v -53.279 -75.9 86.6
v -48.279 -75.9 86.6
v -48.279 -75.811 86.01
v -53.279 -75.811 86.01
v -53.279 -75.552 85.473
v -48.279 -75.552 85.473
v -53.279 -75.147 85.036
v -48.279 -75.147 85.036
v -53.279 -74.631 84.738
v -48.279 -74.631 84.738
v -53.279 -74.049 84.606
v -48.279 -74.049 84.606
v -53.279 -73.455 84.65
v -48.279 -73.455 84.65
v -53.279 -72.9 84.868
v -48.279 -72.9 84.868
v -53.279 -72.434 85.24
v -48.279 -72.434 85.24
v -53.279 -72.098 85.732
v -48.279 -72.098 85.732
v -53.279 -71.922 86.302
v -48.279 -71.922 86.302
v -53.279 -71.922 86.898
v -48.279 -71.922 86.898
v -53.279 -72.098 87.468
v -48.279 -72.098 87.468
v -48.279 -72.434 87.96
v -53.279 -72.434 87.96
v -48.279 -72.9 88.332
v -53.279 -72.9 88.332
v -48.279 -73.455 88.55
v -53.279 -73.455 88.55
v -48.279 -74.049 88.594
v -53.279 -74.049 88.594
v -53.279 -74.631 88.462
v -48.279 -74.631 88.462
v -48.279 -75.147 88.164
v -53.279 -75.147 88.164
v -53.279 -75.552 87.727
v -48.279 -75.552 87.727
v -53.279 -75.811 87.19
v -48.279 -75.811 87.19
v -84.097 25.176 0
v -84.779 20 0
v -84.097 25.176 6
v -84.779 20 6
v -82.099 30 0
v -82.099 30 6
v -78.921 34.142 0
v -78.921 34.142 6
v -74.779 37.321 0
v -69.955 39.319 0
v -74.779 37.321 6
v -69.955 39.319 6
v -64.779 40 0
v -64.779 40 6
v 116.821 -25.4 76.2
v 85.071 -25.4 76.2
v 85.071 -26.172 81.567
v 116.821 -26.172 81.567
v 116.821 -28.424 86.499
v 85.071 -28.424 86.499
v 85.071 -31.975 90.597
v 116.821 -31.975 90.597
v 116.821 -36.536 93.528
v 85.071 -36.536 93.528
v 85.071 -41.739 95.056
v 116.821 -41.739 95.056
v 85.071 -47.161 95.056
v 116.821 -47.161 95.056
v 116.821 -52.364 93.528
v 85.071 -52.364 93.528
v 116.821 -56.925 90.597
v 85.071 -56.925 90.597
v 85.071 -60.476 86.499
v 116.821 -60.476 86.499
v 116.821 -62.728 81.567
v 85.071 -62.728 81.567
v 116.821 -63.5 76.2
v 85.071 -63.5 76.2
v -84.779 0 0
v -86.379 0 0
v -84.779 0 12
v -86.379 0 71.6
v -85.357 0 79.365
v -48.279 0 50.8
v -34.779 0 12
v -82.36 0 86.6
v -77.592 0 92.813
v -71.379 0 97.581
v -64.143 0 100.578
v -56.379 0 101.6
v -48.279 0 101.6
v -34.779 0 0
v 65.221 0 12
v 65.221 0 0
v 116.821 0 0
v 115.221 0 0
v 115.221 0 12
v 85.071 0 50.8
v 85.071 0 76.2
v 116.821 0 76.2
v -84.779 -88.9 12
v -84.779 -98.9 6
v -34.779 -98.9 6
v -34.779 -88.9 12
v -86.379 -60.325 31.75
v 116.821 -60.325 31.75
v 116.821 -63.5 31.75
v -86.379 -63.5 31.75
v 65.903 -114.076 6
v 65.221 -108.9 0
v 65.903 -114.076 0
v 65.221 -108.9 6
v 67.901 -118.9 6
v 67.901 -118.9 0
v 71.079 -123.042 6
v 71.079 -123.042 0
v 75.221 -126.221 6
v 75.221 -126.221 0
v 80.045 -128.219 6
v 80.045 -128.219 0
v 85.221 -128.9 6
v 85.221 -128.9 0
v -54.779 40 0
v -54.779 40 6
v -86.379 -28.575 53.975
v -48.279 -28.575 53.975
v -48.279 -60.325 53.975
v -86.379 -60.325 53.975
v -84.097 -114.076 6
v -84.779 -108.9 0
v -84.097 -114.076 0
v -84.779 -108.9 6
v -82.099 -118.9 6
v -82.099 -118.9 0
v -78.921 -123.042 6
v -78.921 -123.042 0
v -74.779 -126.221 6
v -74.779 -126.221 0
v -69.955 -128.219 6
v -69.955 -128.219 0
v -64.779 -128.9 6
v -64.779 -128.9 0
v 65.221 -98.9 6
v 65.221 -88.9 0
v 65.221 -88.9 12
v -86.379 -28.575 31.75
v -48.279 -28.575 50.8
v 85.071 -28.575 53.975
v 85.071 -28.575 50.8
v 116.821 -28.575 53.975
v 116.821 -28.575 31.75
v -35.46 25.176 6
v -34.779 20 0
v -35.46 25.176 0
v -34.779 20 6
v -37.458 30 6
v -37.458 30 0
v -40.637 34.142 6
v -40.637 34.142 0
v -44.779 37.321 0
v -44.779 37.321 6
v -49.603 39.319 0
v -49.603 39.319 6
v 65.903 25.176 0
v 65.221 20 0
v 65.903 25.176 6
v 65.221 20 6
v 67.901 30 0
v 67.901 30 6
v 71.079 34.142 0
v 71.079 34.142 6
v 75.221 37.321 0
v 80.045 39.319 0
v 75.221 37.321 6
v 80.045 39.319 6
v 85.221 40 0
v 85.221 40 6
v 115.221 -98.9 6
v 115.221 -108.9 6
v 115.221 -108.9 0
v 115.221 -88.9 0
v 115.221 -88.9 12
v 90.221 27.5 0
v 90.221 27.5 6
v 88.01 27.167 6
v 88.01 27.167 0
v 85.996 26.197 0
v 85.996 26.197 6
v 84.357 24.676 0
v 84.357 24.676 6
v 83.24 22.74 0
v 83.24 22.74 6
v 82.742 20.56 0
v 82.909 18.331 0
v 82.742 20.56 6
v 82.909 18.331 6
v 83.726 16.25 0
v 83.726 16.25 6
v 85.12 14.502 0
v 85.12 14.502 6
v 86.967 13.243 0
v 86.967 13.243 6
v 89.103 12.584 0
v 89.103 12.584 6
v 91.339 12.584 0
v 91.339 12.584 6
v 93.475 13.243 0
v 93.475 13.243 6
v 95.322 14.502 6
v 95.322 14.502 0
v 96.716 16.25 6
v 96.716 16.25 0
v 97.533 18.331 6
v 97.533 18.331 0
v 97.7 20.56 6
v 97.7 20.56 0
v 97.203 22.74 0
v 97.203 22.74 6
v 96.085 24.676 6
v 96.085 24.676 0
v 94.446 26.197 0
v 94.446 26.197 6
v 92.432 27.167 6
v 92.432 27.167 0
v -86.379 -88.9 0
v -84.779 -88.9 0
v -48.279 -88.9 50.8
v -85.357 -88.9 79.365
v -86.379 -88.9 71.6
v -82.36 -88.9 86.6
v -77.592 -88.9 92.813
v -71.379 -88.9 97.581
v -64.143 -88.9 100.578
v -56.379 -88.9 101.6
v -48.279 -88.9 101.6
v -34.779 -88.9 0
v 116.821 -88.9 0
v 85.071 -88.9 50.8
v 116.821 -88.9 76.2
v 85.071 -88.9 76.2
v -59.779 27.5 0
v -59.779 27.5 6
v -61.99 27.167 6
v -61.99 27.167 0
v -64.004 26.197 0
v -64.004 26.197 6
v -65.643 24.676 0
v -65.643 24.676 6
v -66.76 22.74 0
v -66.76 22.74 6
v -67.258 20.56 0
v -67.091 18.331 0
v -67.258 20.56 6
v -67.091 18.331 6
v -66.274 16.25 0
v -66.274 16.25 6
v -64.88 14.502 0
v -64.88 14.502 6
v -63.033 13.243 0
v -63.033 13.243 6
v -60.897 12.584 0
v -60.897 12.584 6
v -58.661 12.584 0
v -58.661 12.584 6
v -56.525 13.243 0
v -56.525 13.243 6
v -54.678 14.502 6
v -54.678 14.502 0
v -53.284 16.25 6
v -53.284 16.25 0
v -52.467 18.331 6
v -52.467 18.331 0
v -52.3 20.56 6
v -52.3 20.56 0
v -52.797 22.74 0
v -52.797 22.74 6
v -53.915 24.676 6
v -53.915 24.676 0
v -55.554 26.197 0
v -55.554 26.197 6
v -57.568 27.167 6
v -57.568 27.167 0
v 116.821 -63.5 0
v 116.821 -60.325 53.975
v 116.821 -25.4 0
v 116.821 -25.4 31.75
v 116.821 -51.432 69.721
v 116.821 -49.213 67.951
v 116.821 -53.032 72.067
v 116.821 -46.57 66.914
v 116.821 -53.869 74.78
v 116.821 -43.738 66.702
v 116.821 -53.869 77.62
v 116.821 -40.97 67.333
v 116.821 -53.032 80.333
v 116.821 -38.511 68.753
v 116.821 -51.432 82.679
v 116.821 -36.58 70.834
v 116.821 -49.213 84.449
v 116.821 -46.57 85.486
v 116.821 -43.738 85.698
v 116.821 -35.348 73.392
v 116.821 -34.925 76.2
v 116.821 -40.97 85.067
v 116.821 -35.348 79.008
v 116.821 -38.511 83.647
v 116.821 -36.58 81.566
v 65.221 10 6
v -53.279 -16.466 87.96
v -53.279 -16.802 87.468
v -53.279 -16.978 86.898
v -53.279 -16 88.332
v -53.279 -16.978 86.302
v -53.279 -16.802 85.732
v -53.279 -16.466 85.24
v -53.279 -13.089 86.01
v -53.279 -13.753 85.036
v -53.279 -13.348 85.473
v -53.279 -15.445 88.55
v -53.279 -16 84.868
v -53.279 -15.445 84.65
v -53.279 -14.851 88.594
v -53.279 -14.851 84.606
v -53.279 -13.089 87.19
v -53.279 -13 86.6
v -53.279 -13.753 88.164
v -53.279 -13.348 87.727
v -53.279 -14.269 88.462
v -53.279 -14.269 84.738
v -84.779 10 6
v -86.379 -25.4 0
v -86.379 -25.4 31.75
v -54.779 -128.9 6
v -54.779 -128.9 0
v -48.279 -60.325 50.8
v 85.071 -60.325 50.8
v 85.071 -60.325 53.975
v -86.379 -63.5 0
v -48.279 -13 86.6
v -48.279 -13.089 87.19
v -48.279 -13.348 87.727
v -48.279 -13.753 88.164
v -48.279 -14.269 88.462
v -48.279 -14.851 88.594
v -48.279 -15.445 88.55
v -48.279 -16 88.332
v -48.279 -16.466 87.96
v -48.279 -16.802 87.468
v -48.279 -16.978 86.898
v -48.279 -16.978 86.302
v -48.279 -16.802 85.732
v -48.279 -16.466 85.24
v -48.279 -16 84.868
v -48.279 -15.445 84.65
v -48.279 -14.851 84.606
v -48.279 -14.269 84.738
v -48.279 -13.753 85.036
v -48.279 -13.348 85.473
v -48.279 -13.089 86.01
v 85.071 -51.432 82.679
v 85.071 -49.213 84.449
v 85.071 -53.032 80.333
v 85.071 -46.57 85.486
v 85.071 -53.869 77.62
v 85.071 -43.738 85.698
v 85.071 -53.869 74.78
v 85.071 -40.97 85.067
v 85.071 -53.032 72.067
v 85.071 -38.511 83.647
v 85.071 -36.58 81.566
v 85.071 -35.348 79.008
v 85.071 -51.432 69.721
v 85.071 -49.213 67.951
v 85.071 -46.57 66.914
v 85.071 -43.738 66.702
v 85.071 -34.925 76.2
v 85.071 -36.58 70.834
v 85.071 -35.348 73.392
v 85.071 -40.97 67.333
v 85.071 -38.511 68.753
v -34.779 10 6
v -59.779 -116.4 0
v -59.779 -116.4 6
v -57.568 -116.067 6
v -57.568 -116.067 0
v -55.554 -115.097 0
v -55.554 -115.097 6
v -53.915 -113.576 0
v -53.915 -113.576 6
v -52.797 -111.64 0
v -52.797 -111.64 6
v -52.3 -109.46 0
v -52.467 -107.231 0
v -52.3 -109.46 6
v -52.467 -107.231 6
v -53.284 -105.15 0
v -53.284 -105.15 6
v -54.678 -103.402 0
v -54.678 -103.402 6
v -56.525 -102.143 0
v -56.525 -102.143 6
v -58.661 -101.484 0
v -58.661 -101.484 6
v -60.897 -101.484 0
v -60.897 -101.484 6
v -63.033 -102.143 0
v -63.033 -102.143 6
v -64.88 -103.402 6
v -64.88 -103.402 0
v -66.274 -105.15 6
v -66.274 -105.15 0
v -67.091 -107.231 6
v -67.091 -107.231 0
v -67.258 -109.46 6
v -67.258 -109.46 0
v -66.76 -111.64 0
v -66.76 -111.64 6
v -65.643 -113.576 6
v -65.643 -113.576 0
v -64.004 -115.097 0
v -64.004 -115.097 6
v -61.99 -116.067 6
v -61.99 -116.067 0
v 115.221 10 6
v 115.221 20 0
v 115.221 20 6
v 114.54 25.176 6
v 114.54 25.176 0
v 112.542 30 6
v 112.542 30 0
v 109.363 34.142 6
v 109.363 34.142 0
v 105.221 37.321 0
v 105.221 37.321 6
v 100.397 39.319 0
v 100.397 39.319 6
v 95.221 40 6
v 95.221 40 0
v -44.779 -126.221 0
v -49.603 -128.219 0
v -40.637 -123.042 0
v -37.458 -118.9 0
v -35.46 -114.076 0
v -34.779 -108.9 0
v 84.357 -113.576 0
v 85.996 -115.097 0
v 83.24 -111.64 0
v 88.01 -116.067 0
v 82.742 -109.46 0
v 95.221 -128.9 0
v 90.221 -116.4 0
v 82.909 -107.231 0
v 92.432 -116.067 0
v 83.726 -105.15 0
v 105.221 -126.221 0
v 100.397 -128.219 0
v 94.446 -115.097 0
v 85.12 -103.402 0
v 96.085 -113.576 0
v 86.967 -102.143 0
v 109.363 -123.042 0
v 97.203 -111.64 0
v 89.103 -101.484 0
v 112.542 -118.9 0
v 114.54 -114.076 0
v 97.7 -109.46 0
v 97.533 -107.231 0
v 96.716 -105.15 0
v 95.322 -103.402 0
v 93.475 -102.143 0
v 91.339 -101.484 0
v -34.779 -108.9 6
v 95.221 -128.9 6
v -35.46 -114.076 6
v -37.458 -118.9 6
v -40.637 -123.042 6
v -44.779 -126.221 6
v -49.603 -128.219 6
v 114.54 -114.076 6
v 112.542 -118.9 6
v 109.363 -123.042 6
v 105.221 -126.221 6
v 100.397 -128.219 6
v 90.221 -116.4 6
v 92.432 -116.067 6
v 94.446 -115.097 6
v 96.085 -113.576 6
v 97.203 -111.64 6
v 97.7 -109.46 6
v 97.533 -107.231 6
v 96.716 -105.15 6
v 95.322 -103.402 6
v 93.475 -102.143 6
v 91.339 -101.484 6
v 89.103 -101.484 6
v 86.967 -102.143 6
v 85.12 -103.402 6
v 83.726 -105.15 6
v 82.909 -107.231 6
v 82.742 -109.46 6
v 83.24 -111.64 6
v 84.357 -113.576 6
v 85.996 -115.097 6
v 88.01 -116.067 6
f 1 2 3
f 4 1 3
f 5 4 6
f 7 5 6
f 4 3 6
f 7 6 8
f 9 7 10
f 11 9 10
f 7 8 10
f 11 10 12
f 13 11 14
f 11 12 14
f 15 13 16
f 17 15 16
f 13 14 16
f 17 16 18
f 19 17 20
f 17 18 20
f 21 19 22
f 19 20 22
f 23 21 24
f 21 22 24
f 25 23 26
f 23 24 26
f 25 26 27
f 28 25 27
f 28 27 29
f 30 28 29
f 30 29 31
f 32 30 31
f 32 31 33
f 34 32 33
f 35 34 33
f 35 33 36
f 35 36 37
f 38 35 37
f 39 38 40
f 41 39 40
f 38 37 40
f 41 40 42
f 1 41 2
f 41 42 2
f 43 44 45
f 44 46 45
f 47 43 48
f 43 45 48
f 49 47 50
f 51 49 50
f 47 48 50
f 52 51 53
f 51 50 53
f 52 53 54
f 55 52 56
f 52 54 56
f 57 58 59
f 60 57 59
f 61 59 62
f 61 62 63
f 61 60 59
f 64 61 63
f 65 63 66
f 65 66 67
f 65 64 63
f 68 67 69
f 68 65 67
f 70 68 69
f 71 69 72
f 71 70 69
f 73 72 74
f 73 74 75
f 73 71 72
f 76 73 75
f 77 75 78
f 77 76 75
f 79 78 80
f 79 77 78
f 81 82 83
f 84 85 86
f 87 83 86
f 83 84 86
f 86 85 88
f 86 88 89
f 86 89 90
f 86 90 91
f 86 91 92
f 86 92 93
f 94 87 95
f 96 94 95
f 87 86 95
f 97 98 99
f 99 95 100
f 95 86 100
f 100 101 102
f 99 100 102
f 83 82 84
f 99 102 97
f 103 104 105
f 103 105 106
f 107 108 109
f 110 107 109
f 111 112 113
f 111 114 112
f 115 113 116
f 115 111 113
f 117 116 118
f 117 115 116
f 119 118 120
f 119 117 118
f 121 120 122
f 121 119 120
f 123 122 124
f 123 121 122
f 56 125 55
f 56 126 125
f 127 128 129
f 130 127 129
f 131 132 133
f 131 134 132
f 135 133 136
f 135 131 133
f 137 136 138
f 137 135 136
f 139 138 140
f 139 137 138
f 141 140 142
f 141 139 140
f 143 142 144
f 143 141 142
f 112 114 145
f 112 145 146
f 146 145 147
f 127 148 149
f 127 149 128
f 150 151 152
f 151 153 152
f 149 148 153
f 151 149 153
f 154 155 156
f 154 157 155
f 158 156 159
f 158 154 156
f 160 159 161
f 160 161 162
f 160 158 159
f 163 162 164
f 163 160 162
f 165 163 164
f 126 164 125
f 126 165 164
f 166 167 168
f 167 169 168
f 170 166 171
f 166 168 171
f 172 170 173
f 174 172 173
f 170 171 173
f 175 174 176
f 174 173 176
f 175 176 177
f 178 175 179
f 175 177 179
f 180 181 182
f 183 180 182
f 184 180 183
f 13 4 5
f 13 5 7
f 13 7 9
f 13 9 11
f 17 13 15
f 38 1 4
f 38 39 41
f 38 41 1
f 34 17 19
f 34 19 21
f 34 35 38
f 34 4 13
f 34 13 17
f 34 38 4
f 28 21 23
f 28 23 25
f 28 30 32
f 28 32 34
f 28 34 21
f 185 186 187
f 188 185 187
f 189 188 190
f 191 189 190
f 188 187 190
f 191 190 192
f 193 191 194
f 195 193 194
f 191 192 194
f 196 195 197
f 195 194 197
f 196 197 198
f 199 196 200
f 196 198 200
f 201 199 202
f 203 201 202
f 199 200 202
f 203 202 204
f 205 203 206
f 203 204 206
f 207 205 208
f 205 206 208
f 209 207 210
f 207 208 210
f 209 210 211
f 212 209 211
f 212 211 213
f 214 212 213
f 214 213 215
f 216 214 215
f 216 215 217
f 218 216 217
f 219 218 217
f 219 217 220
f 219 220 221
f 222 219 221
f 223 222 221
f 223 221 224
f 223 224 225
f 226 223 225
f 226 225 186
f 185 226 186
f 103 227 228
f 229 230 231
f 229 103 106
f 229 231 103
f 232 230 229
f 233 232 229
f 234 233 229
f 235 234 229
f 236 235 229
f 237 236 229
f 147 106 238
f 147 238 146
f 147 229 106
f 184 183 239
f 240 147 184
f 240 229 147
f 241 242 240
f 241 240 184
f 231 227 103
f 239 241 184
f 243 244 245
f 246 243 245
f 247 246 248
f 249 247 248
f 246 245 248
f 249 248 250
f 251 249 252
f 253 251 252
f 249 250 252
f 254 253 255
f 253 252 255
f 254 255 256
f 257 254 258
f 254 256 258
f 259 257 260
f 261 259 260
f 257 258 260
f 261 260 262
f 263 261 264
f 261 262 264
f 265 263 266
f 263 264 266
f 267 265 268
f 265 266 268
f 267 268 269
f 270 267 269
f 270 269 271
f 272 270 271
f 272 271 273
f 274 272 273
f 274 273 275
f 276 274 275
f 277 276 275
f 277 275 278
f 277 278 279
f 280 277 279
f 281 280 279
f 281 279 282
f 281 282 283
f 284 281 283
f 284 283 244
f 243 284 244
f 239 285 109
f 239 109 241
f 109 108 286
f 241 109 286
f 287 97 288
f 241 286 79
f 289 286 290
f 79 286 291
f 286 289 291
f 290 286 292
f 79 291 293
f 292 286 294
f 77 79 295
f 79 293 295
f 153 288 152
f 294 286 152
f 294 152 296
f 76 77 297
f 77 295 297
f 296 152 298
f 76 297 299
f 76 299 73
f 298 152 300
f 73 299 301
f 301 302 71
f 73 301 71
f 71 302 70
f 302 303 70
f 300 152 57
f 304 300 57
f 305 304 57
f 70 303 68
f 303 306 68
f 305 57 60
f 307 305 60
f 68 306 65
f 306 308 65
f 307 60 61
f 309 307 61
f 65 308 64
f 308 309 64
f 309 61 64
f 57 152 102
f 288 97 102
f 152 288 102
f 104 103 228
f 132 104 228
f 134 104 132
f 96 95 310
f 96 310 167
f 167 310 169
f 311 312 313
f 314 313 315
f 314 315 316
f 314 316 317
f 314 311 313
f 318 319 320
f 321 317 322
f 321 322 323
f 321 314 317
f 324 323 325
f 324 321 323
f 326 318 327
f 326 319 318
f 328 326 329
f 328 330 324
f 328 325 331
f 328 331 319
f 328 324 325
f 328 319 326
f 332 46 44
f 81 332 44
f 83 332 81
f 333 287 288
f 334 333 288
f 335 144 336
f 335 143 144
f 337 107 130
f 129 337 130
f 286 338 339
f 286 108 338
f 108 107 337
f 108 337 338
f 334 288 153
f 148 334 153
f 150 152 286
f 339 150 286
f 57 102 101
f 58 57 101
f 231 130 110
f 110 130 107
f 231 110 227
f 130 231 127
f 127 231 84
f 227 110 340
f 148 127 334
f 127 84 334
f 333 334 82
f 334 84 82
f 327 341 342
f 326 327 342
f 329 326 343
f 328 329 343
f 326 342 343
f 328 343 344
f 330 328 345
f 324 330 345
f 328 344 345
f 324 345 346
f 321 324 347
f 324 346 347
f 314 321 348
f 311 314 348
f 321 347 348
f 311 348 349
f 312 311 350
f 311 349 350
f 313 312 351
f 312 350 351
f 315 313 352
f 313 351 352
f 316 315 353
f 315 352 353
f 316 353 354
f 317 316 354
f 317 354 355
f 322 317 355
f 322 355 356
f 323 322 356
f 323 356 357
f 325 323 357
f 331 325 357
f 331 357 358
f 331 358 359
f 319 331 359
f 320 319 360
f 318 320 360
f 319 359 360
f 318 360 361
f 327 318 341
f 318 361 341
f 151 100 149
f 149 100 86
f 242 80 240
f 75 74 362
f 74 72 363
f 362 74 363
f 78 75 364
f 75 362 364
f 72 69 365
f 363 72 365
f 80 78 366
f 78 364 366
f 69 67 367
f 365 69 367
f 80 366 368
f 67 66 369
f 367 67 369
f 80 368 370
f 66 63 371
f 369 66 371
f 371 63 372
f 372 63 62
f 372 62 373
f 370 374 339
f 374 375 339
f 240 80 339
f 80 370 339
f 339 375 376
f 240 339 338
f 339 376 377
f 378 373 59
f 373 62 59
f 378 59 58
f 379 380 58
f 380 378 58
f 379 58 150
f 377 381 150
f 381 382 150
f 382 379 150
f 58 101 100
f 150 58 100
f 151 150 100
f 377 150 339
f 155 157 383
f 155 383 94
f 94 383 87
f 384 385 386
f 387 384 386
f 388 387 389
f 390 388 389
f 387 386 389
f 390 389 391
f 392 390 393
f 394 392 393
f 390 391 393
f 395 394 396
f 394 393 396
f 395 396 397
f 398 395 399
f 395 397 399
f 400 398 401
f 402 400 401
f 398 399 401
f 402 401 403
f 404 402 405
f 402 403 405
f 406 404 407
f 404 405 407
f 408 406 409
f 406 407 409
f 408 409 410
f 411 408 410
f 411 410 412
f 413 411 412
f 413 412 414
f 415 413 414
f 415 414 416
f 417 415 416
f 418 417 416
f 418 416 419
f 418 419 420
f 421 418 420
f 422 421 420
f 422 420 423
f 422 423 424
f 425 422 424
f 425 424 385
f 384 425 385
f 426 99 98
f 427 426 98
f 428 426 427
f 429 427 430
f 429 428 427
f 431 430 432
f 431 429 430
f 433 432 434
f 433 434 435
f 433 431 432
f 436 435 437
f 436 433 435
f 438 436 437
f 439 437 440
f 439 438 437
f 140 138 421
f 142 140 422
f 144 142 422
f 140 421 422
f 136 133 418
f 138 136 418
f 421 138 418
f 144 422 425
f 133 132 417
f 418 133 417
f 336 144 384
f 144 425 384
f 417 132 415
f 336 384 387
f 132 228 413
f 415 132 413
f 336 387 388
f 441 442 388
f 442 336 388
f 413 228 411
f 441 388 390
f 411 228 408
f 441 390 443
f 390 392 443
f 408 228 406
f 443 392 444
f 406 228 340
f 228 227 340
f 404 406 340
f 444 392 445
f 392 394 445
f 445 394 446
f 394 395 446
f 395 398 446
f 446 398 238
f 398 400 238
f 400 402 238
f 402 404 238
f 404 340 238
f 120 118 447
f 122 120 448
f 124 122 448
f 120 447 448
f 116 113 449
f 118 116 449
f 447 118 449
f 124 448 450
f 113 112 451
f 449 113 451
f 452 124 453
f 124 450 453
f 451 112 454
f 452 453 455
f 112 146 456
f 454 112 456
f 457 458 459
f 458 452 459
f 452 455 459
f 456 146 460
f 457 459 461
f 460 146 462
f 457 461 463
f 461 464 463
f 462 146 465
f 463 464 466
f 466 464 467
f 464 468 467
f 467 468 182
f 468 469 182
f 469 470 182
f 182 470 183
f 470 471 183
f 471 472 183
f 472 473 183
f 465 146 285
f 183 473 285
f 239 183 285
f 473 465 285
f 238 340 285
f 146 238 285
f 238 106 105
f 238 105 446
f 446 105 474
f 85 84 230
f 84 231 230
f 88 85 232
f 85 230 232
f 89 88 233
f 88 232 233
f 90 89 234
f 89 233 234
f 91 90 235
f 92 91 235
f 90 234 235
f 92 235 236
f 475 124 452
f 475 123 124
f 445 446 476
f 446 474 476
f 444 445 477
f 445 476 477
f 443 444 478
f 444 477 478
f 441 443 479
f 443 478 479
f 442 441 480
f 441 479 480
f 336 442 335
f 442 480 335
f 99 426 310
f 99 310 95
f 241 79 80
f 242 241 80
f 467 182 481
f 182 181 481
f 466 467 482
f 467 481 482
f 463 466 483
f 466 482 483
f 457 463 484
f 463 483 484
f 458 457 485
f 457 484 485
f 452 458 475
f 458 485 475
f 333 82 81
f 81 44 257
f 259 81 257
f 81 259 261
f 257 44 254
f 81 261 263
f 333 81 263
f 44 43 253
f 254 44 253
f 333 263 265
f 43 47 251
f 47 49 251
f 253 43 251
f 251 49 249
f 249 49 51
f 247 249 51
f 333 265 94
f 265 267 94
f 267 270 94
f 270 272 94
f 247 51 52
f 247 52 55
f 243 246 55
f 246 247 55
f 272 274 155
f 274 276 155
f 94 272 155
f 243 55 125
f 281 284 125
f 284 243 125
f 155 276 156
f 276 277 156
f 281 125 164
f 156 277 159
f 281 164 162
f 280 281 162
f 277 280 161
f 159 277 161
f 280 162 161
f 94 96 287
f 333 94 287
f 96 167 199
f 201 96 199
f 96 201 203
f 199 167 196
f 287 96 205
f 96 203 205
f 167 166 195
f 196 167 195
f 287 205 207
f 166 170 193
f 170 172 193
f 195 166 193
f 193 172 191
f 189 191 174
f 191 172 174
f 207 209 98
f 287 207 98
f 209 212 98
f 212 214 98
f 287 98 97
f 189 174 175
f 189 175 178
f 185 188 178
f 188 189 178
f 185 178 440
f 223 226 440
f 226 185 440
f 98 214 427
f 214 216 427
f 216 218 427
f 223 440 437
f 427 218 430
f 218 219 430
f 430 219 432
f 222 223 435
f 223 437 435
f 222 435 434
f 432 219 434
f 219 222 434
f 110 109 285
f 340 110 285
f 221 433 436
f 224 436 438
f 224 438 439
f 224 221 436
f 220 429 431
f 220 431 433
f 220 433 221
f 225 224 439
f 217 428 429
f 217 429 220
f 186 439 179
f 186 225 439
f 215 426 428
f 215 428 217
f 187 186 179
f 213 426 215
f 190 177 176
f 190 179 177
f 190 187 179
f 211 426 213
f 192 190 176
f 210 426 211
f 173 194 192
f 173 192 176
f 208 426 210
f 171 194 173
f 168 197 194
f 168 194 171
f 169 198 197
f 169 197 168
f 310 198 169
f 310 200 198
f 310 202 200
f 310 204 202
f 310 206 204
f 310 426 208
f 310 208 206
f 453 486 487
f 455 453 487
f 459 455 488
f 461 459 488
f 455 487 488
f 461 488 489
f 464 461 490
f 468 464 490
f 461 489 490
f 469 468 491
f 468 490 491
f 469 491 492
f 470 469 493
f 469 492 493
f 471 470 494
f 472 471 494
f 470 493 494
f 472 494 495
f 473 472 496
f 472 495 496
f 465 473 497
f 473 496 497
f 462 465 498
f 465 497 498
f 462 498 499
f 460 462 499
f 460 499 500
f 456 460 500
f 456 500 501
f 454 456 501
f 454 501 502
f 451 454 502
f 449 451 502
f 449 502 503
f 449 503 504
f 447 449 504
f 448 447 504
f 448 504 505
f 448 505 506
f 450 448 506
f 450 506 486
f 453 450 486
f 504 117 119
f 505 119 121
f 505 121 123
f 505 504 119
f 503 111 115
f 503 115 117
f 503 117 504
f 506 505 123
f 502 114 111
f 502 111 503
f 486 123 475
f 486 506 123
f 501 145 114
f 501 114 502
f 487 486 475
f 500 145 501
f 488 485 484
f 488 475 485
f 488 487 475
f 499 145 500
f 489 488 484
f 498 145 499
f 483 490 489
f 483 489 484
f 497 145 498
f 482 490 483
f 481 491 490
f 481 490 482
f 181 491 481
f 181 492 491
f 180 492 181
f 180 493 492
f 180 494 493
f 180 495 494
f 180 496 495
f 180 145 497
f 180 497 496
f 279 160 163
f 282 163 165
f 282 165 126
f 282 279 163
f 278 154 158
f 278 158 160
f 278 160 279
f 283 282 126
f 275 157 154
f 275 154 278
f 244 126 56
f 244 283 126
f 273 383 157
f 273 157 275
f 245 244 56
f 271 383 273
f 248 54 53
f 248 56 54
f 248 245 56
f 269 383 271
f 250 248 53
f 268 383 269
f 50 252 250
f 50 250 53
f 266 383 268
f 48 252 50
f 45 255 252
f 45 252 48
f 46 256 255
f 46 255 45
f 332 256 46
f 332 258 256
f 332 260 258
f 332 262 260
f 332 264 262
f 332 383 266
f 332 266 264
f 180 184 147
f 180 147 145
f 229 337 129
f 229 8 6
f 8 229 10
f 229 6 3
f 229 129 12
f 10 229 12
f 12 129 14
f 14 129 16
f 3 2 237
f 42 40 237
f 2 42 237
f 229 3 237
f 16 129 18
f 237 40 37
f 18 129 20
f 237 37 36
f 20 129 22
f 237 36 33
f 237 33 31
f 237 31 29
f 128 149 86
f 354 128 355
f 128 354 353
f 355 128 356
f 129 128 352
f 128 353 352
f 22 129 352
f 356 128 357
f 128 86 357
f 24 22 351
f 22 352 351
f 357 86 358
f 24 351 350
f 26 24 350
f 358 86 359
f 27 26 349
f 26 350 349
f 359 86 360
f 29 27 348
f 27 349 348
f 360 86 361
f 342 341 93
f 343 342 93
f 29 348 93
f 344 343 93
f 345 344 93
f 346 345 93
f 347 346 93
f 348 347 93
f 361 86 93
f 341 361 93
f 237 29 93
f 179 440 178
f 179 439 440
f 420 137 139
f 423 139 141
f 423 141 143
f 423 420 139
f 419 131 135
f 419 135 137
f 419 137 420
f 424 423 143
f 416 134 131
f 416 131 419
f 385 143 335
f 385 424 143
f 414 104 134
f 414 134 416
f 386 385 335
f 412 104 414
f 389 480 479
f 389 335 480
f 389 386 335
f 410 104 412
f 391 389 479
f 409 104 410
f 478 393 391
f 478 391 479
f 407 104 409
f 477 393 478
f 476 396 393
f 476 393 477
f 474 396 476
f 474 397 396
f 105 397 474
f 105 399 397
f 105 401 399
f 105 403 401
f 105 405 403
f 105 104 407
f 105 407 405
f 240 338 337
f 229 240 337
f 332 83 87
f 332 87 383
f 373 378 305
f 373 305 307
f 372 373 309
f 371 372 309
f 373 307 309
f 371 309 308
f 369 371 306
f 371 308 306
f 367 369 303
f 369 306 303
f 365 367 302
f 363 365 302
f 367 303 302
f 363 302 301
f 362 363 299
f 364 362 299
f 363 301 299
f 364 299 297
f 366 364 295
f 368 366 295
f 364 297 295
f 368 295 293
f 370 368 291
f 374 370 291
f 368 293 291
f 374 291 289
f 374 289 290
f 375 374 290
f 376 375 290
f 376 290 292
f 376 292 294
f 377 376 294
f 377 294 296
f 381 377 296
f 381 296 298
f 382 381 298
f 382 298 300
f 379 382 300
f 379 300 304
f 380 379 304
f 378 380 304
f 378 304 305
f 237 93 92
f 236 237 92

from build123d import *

# Parameters (mm, degrees)
F1_DEPTH  = 88.9
F2_R      = 30
F4_DEPTH  = 31.75
F5_R      = 7.9375
F6_DEPTH  = 55
F7_W      = 15.875
F7_H      = 22.225
F8_DEPTH  = 265
F9_W      = 50
F9_H      = 6
F10_DEPTH = 40
F11_R     = 20
F12_W     = 50
F12_H     = 6
F13_DEPTH = 40
F14_R     = 20
F16_DEPTH = 25
F18_DEPTH = 25
F20_DEPTH = 25
F22_DEPTH = 25
F24_DEPTH = 50
F26_DEPTH = 50
F28_DEPTH = 50
F30_DEPTH = 50
F31_R     = 2
F32_DEPTH = 5
F33_R     = 9.525
F33_R_2   = 7.9375
F34_DEPTH = 78.1


with BuildPart() as f1:
    # F0 (on Front) → F1 (new body)
    with BuildSketch(Plane.XZ):
        Polygon((-86.3789096475, 101.6), (-86.3789096475, 0), (116.8210903525, 0), (116.8210903525, 76.2), (85.0710903525, 76.2), (85.0710903525, 50.8), (-48.2789096475, 50.8), (-48.2789096475, 101.6), align=None)
    extrude(amount=F1_DEPTH)

    # F2
    f2_edges = [f1.edges().sort_by_distance(p)[0] for p in [
        (-86.37891, -44.45, 101.6),
    ]]
    fillet(f2_edges, radius=F2_R)

    # F3 (on face) → F4 (join)
    with BuildSketch(Plane.YZ.offset(116.8210903525)):
        with BuildLine():
            Line((-63.5, 76.2), (-25.4, 76.2))
            ThreePointArc((-25.4, 76.2), (-44.45, 95.25), (-63.5, 76.2))
        make_face()
    extrude(amount=-F4_DEPTH)

    # F5 (on face) → F6 (cut)
    with BuildSketch(Plane.YZ.offset(116.8210903525)):
        with Locations((-44.45, 76.2)):
            Circle(F5_R)
    extrude(amount=-F6_DEPTH, mode=Mode.SUBTRACT)

    # F7 (on face) → F8 (cut)
    with BuildSketch(Plane.YZ.offset(116.8210903525)):
        Polygon((-63.5, 0), (-44.45, 0), (-25.4, 0), (-25.4, 31.75), (-28.575, 31.75), (-44.45, 31.75), (-60.325, 31.75), (-63.5, 31.75), align=None)
        with Locations((-52.3875, 42.8625)):
            Rectangle(F7_W, F7_H)
        with Locations((-36.5125, 42.8625)):
            Rectangle(F7_W, F7_H)
    extrude(amount=-F8_DEPTH, mode=Mode.SUBTRACT)

    # F9 (on face) → F10 (join)
    with BuildSketch(Plane.XZ.offset(88.9)):
        with Locations((-59.7789096475, 3)):
            Rectangle(F9_W, F9_H)
        with Locations((90.2210903525, 3)):
            Rectangle(F9_W, F9_H)
    extrude(amount=F10_DEPTH)

    # F11
    f11_edges = [f1.edges().sort_by_distance(p)[0] for p in [
        (-84.77891, -128.9, 3),
        (-34.77891, -128.9, 3),
        (65.22109, -128.9, 3),
        (115.22109, -128.9, 3),
    ]]
    fillet(f11_edges, radius=F11_R)

    # F12 (on face) → F13 (join)
    with BuildSketch(Plane(origin=(0, 0, 0), x_dir=(-1, 0, 0), z_dir=(0, 1, 0))):
        with Locations((-90.2210903525, 3)):
            Rectangle(F12_W, F12_H)
        with Locations((59.7789096475, 3)):
            Rectangle(F12_W, F12_H)
    extrude(amount=F13_DEPTH)

    # F14
    f14_edges = [f1.edges().sort_by_distance(p)[0] for p in [
        (115.22109, 40, 3),
        (65.22109, 40, 3),
        (-34.77891, 40, 3),
        (-84.77891, 40, 3),
    ]]
    fillet(f14_edges, radius=F14_R)

    # F15 (on face) → F16 (cut)
    with BuildSketch(Plane.XY.offset(6)):
        with BuildLine():
            ThreePointArc((97.7210903525, 20), (95.5243912114, 25.3033008589), (90.2210903525, 27.5))
            ThreePointArc((90.2210903525, 27.5), (84.9177894936, 14.6966991411), (97.7210903525, 20))
        make_face()
    extrude(amount=-F16_DEPTH, mode=Mode.SUBTRACT)

    # F17 (on face) → F18 (cut)
    with BuildSketch(Plane.XY.offset(6)):
        with BuildLine():
            ThreePointArc((-52.2789096475, 20), (-54.4756087886, 25.3033008589), (-59.7789096475, 27.5))
            ThreePointArc((-59.7789096475, 27.5), (-65.0822105064, 14.6966991411), (-52.2789096475, 20))
        make_face()
    extrude(amount=-F18_DEPTH, mode=Mode.SUBTRACT)

    # F19 (on face) → F20 (cut)
    with BuildSketch(Plane.XY.offset(6)):
        with BuildLine():
            ThreePointArc((-52.2789096475, -108.9), (-65.0822105064, -103.5966991411), (-59.7789096475, -116.4))
            ThreePointArc((-59.7789096475, -116.4), (-54.4756087886, -114.2033008589), (-52.2789096475, -108.9))
        make_face()
    extrude(amount=-F20_DEPTH, mode=Mode.SUBTRACT)

    # F21 (on face) → F22 (cut)
    with BuildSketch(Plane.XY.offset(6)):
        with BuildLine():
            ThreePointArc((97.7210903525, -108.9), (84.9177894936, -103.5966991411), (90.2210903525, -116.4))
            ThreePointArc((90.2210903525, -116.4), (95.5243912114, -114.2033008589), (97.7210903525, -108.9))
        make_face()
    extrude(amount=-F22_DEPTH, mode=Mode.SUBTRACT)

    # F23 (on face) → F24 (join)
    with BuildSketch(Plane(origin=(-84.7789096475, 0, 0), x_dir=(0, -1, 0), z_dir=(-1, 0, 0))):
        Polygon((88.9, 6), (98.9, 6), (88.9, 12), align=None)
    extrude(amount=-F24_DEPTH)

    # F25 (on face) → F26 (join)
    with BuildSketch(Plane.YZ.offset(115.2210903525)):
        Polygon((-88.9, 12), (-98.9, 6), (-88.9, 6), align=None)
    extrude(amount=-F26_DEPTH)

    # F27 (on face) → F28 (join)
    with BuildSketch(Plane.YZ.offset(115.2210903525)):
        Polygon((0, 6), (10, 6), (0, 12), align=None)
    extrude(amount=-F28_DEPTH)

    # F29 (on face) → F30 (join)
    with BuildSketch(Plane(origin=(-84.7789096475, 0, 0), x_dir=(0, -1, 0), z_dir=(-1, 0, 0))):
        Polygon((0, 12), (-10, 6), (0, 6), align=None)
    extrude(amount=-F30_DEPTH)

    # F31 (on face) → F32 (cut)
    with BuildSketch(Plane.YZ.offset(-48.2789096475)):
        with BuildLine():
            ThreePointArc((-71.9, 86.6), (-73.9, 88.6), (-75.9, 86.6))
            ThreePointArc((-75.9, 86.6), (-73.9, 84.6), (-71.9, 86.6))
        make_face()
        with Locations((-15, 86.6)):
            Circle(F31_R)
    extrude(amount=-F32_DEPTH, mode=Mode.SUBTRACT)

    # F33 (on face) → F34 (cut)
    with BuildSketch(Plane.YZ.offset(116.8210903525)):
        with Locations((-44.45, 76.2)):
            Circle(F33_R)
        with Locations((-44.45, 76.2)):
            Circle(F33_R_2, mode=Mode.SUBTRACT)
    extrude(amount=-F34_DEPTH, mode=Mode.SUBTRACT)


solid = f1.part
